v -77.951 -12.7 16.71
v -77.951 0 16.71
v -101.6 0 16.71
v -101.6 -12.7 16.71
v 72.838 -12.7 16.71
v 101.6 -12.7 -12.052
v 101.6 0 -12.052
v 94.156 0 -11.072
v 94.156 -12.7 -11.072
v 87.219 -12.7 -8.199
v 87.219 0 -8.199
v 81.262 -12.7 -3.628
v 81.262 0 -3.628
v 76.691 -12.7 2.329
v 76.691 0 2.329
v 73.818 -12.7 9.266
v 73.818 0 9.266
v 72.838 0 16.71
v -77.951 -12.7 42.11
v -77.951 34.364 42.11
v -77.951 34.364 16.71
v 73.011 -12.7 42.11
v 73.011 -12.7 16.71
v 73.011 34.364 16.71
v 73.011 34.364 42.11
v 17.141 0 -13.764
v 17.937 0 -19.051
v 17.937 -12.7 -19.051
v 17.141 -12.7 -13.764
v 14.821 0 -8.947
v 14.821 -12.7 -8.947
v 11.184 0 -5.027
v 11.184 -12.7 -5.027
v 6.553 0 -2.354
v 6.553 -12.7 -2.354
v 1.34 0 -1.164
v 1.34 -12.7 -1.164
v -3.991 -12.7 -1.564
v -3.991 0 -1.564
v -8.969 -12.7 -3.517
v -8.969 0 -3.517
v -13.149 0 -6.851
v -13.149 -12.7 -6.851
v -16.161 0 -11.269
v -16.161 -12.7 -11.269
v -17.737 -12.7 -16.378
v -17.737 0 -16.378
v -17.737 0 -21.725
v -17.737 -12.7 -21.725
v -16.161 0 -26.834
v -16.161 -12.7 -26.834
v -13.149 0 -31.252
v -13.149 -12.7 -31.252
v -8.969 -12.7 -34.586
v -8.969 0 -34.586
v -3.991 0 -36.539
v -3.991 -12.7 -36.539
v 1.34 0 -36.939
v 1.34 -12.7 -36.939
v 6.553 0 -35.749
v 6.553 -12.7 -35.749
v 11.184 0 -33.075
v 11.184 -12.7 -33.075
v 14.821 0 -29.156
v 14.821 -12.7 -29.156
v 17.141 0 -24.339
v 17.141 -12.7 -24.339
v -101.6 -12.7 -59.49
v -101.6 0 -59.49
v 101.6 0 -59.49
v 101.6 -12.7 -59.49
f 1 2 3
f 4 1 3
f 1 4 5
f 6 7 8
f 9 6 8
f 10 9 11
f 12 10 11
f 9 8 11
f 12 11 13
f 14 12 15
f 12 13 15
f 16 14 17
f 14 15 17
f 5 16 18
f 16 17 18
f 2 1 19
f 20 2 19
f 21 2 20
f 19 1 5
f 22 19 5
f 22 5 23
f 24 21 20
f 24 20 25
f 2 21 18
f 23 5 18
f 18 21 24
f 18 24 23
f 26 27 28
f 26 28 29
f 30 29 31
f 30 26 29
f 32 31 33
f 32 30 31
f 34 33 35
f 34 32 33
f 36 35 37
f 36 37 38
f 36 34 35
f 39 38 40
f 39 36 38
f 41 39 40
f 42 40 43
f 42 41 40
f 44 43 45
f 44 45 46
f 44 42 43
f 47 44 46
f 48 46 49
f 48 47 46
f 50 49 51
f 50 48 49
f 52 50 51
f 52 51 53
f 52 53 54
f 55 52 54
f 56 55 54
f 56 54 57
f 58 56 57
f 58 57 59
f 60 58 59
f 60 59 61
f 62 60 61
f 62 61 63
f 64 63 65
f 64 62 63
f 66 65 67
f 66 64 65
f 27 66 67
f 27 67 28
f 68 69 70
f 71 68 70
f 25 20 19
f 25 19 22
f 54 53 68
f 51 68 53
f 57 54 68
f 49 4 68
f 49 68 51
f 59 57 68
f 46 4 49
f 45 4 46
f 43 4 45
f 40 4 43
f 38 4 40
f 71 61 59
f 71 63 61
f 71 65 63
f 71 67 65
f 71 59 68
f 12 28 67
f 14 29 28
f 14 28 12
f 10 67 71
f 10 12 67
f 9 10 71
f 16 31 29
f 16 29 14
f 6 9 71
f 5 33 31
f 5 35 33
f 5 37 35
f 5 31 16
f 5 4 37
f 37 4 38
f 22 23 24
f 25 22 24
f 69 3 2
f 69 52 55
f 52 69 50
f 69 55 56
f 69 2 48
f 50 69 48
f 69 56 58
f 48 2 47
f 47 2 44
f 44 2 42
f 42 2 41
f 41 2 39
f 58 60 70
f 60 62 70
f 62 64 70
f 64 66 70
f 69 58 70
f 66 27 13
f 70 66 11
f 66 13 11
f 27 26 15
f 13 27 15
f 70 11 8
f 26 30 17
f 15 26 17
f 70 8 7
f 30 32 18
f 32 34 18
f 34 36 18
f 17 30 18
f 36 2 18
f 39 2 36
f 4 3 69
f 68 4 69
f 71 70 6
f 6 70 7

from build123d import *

# Parameters (mm, degrees)
F0_R     = 17.937476
F1_DEPTH = 12.7
F2_W     = 150.962264
F2_H     = 47.064063
F3_DEPTH = 25.4


with BuildPart() as f1:
    # F0 (on Front) → F1 (new body)
    with BuildSketch(Plane.XZ):
        with BuildLine():
            Line((72.837895, 16.709986), (-101.6, 16.709986))
            Line((-101.6, 16.709986), (-101.6, -59.490014))
            Line((-101.6, -59.490014), (101.6, -59.490014))
            Line((101.6, -59.490014), (101.6, -12.052119))
            ThreePointArc((101.6, -12.052119), (81.26212, -3.627894), (72.837895, 16.709986))
        make_face()
        with Locations((0, -19.051408)):
            Circle(F0_R, mode=Mode.SUBTRACT)
    extrude(amount=F1_DEPTH)

    # F2 (on face) → F3 (join)
    with BuildSketch(Plane.XY.offset(16.709986)):
        with Locations((-2.470292, 10.832032)):
            Rectangle(F2_W, F2_H)
    extrude(amount=F3_DEPTH)


solid = f1.part
